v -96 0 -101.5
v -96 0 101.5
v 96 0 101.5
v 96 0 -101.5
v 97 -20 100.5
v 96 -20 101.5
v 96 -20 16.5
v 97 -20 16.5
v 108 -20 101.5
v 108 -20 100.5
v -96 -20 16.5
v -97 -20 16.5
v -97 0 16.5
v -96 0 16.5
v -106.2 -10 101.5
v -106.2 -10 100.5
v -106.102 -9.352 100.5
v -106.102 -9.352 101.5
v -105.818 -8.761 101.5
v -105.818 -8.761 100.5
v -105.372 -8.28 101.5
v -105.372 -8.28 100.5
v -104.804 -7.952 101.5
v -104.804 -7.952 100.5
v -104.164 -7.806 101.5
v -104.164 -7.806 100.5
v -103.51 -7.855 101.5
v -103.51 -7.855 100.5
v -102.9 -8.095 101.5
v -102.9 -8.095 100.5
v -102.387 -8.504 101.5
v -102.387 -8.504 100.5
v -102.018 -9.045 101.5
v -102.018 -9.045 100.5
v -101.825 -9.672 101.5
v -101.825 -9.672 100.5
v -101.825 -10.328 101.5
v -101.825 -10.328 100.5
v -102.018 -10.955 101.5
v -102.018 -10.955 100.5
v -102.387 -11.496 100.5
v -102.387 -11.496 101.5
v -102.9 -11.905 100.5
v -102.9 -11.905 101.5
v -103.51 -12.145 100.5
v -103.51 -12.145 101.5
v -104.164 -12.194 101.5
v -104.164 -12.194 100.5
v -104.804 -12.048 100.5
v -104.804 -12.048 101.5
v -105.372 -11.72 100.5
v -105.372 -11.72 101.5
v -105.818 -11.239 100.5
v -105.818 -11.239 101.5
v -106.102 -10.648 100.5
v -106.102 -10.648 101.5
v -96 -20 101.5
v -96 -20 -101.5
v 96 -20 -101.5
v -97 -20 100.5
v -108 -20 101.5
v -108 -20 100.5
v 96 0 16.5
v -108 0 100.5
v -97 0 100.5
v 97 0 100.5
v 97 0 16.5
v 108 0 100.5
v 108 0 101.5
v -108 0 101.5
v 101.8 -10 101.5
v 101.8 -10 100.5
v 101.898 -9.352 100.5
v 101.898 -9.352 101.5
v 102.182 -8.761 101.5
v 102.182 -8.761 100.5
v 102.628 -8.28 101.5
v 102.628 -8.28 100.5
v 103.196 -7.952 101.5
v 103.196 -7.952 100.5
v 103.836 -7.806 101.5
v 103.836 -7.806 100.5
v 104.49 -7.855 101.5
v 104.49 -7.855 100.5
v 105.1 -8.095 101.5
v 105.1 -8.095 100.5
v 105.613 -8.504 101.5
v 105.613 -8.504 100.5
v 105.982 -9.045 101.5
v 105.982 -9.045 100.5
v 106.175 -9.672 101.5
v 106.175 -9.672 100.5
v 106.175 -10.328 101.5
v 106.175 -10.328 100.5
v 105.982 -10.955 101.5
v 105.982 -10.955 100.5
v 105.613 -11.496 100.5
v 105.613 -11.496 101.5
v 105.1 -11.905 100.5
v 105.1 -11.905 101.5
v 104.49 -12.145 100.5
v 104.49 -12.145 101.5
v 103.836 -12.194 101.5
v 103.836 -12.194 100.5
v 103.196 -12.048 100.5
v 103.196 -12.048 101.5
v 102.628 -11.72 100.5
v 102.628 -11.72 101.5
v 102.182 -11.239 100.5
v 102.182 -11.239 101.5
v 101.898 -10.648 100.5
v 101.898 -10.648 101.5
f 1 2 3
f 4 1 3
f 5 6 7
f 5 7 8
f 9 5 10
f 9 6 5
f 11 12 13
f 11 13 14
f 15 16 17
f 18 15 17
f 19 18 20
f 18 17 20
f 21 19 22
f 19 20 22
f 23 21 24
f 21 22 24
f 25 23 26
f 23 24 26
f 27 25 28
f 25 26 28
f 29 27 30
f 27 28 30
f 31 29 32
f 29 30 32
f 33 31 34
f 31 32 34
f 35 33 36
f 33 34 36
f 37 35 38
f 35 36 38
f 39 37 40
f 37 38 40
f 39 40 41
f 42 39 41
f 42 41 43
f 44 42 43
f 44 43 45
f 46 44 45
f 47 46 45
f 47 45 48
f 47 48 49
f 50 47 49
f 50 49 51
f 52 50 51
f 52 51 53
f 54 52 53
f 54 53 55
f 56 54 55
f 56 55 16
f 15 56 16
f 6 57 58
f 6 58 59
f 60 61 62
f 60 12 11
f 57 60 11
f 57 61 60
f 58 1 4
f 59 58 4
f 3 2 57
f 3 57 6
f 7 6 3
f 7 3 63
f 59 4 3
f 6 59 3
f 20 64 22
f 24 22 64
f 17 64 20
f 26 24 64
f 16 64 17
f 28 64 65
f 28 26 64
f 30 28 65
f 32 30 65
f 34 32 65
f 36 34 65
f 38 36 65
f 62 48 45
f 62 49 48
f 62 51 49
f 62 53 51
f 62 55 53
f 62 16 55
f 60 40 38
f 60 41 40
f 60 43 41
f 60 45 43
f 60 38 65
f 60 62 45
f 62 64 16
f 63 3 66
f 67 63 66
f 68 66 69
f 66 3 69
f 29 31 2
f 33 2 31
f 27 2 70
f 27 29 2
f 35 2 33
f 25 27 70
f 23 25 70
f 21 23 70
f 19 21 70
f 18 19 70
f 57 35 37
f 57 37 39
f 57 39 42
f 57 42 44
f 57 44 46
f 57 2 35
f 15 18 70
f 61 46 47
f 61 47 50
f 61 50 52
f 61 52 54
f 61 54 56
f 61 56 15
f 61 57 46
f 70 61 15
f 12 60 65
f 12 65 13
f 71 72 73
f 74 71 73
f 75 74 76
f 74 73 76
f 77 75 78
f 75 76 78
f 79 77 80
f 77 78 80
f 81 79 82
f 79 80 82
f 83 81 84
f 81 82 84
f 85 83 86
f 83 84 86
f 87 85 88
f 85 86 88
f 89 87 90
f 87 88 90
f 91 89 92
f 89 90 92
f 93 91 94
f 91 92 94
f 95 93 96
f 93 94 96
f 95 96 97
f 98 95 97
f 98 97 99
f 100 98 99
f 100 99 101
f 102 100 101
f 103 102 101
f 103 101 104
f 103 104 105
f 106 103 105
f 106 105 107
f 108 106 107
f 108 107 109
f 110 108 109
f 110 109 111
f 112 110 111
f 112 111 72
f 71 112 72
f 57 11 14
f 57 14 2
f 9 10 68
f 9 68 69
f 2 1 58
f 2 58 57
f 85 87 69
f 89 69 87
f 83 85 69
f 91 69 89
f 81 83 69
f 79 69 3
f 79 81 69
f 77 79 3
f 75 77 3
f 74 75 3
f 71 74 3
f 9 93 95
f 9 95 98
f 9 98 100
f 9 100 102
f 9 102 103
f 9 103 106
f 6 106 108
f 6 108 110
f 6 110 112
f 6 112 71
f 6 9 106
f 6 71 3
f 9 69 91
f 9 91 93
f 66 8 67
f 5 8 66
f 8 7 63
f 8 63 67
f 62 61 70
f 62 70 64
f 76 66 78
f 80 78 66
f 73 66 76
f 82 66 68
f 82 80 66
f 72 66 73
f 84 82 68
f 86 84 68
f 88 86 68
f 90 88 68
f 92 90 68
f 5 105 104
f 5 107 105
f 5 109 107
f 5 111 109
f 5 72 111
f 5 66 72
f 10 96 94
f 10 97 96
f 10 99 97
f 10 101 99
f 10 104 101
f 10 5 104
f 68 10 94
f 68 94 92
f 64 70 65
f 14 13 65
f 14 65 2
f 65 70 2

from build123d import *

# Parameters (mm, degrees)
F0_W       = 192
F0_H       = 203
F1_DEPTH   = 20
F3_DEPTH   = 20
F5_D       = 4.4
F5_DEPTH   = 12
F5_TIP     = 1.3218933619
F5_2_D     = 4.4
F5_2_DEPTH = 12
F5_2_TIP   = 1.3218933619


with BuildPart() as f1:
    # F0 (on Front) → F1 (new body)
    with BuildSketch(Plane.XZ):
        Rectangle(F0_W, F0_H)
    extrude(amount=F1_DEPTH)


with BuildPart() as f3:
    # F2 (on face) → F3 (new body)
    with BuildSketch(Plane.XZ.offset(20)):
        Polygon((-96, 16.5), (-96, 101.5), (-97, 101.5), (-108, 101.5), (-108, 100.5), (-97, 100.5), (-97, 16.5), align=None)
    extrude(amount=-F3_DEPTH)

    # F5
    with Locations(Plane.XY.offset(101.5)):
        with Locations((-104, -10), (104, -10)):
            Hole(F5_D / 2, depth=F5_DEPTH)
            with Locations((0, 0, -(F5_DEPTH + F5_TIP / 2))):  # 118° drill point
                Cone(0, F5_D / 2, F5_TIP, mode=Mode.SUBTRACT)


with BuildPart() as f3b:
    # F2 (on face) → F3, piece 2 (new body)
    with BuildSketch(Plane.XZ.offset(20)):
        Polygon((108, 100.5), (108, 101.5), (97, 101.5), (96, 101.5), (96, 16.5), (97, 16.5), (97, 100.5), align=None)
    extrude(amount=-F3_DEPTH)

    # F5#2
    with Locations(Plane.XY.offset(101.5)):
        with Locations((-104, -10), (104, -10)):
            Hole(F5_2_D / 2, depth=F5_2_DEPTH)
            with Locations((0, 0, -(F5_2_DEPTH + F5_2_TIP / 2))):  # 118° drill point
                Cone(0, F5_2_D / 2, F5_2_TIP, mode=Mode.SUBTRACT)


solid = Compound([f1.part, f3.part, f3b.part])
